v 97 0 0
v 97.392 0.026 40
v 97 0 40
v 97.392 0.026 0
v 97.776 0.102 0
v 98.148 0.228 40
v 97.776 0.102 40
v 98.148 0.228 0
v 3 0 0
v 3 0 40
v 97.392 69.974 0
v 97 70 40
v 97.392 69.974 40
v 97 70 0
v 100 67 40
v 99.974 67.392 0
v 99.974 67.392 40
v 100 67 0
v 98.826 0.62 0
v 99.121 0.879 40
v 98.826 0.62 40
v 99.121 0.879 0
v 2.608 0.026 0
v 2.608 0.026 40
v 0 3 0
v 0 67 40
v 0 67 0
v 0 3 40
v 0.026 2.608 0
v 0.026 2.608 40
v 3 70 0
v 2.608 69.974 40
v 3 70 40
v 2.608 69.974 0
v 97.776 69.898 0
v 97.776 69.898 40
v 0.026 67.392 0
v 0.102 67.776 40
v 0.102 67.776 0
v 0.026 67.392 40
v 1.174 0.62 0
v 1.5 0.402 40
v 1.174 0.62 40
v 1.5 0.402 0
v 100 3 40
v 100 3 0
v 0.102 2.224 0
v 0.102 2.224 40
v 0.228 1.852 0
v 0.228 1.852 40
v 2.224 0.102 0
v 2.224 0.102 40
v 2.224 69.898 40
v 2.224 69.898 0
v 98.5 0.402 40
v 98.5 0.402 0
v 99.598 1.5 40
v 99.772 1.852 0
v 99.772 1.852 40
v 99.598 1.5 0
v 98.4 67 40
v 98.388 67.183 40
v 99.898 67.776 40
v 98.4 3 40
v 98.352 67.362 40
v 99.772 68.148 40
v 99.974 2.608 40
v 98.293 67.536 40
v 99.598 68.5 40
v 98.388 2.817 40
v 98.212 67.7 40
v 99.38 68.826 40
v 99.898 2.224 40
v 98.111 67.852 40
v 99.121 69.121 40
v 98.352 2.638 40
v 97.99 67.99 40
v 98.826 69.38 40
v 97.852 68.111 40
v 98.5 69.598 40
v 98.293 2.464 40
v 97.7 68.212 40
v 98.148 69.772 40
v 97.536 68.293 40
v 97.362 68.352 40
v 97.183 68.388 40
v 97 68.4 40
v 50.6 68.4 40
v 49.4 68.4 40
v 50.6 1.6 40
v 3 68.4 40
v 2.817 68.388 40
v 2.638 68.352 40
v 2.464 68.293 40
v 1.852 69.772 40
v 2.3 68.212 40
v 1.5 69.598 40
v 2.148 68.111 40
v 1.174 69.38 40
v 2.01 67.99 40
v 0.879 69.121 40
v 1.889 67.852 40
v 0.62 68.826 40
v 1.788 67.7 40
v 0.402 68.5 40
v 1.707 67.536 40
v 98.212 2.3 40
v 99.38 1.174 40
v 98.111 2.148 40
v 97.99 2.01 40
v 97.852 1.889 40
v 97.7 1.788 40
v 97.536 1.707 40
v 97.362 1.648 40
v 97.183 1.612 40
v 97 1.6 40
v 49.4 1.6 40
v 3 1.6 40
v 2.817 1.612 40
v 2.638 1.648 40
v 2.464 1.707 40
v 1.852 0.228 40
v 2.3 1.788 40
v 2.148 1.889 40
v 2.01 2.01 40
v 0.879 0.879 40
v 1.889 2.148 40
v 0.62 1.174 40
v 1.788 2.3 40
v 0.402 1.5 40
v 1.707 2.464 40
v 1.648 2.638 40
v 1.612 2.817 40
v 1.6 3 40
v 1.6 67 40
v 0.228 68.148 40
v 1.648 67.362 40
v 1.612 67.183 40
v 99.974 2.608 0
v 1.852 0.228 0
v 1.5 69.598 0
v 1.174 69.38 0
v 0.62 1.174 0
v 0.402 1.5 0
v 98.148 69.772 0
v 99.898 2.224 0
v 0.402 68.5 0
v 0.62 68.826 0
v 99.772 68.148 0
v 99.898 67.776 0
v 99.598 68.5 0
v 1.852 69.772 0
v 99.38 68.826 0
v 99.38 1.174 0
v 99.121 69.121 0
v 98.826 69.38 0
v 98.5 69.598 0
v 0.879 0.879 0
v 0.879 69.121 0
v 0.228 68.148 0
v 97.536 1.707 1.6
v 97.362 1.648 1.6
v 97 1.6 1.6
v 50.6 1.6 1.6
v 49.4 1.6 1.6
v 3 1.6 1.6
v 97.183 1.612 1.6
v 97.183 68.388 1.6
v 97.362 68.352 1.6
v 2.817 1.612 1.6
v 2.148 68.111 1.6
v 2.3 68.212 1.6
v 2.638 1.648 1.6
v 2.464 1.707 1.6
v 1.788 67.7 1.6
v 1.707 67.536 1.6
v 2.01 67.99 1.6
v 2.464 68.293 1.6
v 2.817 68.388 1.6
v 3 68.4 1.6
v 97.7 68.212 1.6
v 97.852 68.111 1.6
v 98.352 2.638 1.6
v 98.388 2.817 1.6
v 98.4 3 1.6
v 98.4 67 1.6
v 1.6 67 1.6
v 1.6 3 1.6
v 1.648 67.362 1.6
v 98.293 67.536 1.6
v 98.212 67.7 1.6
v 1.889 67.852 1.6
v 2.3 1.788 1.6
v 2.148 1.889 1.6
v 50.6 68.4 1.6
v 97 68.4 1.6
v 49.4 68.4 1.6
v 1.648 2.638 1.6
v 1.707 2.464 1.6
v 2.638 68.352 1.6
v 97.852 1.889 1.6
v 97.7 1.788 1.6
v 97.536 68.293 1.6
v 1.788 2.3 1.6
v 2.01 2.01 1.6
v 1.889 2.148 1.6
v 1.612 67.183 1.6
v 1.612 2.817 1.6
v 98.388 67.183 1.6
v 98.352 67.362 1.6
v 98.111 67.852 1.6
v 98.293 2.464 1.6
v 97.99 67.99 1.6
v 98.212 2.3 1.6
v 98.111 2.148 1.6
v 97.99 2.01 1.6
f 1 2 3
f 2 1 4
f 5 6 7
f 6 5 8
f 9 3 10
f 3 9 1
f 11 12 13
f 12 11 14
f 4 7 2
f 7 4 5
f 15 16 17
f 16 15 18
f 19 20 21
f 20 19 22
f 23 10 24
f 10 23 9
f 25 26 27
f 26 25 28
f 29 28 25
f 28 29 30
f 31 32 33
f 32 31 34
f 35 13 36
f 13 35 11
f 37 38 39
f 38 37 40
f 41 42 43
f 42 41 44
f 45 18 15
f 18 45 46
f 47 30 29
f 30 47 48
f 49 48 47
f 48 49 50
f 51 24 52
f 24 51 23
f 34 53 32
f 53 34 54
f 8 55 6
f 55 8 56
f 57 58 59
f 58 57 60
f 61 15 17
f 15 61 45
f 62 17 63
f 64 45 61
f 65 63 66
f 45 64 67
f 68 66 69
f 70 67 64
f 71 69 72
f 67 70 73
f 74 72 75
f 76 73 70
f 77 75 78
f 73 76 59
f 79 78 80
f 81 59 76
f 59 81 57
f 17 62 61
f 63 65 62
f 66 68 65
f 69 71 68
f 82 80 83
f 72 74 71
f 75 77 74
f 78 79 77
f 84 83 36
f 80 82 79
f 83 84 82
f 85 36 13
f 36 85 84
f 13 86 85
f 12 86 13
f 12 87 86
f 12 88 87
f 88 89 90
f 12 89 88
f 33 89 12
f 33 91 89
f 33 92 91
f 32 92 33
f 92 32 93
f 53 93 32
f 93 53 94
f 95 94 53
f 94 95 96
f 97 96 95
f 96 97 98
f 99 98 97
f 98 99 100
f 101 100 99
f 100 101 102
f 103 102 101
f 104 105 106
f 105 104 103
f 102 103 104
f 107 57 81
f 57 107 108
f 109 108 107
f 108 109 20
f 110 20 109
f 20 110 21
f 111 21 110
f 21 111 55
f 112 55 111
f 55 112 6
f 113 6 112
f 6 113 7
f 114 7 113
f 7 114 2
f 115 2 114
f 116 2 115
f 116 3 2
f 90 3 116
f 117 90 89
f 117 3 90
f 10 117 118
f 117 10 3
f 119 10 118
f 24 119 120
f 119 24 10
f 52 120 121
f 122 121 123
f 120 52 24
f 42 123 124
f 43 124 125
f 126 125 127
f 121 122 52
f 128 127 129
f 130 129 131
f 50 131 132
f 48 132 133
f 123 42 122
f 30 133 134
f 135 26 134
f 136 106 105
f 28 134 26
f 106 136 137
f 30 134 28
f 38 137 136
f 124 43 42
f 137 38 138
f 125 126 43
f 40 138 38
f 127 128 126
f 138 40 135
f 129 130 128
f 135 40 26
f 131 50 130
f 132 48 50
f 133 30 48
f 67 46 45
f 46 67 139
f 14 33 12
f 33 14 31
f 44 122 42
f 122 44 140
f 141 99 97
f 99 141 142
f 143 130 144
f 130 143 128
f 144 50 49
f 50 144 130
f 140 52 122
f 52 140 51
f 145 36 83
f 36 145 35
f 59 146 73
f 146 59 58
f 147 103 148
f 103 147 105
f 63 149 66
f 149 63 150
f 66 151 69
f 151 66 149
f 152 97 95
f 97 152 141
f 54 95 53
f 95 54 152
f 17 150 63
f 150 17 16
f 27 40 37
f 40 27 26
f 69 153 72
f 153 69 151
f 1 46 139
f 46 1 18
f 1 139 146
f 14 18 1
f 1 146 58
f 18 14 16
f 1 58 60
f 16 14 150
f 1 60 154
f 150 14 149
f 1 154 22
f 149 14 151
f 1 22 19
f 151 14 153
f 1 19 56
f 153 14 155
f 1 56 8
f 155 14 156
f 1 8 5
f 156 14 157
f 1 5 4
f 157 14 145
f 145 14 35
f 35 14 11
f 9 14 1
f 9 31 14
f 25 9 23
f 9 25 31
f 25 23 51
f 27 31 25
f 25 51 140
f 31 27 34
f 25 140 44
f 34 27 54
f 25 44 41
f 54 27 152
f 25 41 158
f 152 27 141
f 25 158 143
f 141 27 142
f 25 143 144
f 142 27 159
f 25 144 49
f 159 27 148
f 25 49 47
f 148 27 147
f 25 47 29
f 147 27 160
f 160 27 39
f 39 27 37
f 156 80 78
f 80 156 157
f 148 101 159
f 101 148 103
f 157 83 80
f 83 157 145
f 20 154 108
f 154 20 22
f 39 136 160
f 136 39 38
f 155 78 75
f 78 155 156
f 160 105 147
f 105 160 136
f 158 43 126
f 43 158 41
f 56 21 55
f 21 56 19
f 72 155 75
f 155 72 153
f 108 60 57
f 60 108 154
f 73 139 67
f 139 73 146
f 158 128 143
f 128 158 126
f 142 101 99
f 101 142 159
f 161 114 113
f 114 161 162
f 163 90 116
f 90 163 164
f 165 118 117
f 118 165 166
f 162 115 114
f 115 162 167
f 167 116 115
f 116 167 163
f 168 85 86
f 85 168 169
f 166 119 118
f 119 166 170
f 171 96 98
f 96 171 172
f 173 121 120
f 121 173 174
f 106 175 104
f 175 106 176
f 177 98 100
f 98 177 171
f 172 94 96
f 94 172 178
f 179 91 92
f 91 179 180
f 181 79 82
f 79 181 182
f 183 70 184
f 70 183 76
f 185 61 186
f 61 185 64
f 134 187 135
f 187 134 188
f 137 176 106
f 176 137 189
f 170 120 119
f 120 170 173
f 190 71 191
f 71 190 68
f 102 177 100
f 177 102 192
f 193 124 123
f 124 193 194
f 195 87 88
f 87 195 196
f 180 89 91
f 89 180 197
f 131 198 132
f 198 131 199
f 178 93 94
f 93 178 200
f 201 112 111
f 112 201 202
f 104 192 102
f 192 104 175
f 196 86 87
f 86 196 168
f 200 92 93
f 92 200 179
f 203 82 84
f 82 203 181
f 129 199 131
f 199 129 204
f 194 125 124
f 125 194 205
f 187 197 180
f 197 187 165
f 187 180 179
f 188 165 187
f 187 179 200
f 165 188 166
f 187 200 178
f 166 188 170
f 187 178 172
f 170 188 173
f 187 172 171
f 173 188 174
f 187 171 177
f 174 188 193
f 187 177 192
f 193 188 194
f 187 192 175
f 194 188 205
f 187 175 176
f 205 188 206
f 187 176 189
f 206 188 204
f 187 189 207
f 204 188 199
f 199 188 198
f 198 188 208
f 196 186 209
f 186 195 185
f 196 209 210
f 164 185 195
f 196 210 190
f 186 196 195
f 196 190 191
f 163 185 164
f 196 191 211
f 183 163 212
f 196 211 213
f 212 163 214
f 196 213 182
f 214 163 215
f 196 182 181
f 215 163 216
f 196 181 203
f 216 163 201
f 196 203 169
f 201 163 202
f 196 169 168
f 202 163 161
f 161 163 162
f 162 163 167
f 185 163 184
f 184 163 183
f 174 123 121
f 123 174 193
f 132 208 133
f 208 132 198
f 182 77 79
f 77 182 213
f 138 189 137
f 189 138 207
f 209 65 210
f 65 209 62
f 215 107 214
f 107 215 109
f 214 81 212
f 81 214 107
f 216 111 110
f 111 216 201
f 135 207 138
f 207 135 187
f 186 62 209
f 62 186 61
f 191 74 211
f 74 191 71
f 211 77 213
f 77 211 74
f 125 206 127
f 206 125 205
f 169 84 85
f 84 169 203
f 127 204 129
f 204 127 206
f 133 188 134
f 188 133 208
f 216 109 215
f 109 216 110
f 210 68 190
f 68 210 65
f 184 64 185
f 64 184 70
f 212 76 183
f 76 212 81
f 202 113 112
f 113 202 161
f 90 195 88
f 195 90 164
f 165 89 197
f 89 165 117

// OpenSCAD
// Коробка / органайзер (B23). Параметры ниже переопределяет сервер: openscad -D length=100 ...
// Все размеры в мм, внешние. Коробка стоит на столе: длина по X, ширина по Y, высота по Z,
// угол коробки — в начале координат. Крышка (если выбрана) лежит рядом, дном вниз.

length = 100;        // длина снаружи
width = 70;          // ширина снаружи
height = 40;         // высота снаружи (без крышки)
wall = 1.6;          // толщина стенок
floor_t = 1.6;       // толщина дна
corner_r = 3;        // скругление вертикальных углов
cells_x = 2;         // ячеек по длине (1 — без перегородок)
cells_y = 1;         // ячеек по ширине
divider = 1.2;       // толщина перегородок
lid = "none";        // "none" | "inset" (бортик внутрь) | "cap" (колпачок снаружи)
lid_gap = 0.3;       // зазор между крышкой и коробкой, на сторону

$fn = 48;            // гладкость скруглений
eps = 0.01;          // небольшой запас, чтобы вырезы выходили за край детали
lip_h = 4;           // высота бортика крышки
min_cell = 5;        // уже этого ячейки не делаем — лишние перегородки пропускаем
lid_space = 10;      // расстояние между коробкой и крышкой на столе

// --- размеры -----------------------------------------------------------------------------
// Скругление не больше, чем позволяет короткая сторона; изнутри радиус меньше на стенку.
r_out = min(corner_r, (min(length, width) - 1) / 2);
r_in = max(r_out - wall, 0);
in_len = length - 2 * wall;      // внутренние размеры
in_wid = width - 2 * wall;

// Сколько ячеек поместится: каждая не уже min_cell.
function cells_fit(inner, n) =
    n <= 1 ? 1 : max(1, min(n, floor((inner + divider) / (divider + min_cell))));
// Координата i-й перегородки (i = 1..n-1) от внутреннего края: ячейки одинаковой ширины.
function div_pos(inner, n, i) = i * (inner - (n - 1) * divider) / n + (i - 1) * divider;

nx = cells_fit(in_len, cells_x);
ny = cells_fit(in_wid, cells_y);

// Под вкладную крышку перегородки ниже верха на бортик и зазор, иначе — вровень с краем.
div_top = height - (lid == "inset" ? lip_h + lid_gap : 0);

// --- заготовки ---------------------------------------------------------------------------
// Прямоугольник l × w со скруглёнными углами радиуса r, угол в начале координат (2D).
module rrect(l, w, r) {
    if (r > 0)
        translate([r, r]) offset(r = r) square([l - 2 * r, w - 2 * r]);
    else
        square([l, w]);
}

// Стакан: прямоугольная «ванна» l × w × h со стенкой t и дном b, угол в начале координат.
module tub(l, w, h, t, b, r) {
    difference() {
        linear_extrude(h) rrect(l, w, r);
        translate([t, t, b])
            linear_extrude(h - b + eps) rrect(l - 2 * t, w - 2 * t, max(r - t, 0));
    }
}

// --- коробка -----------------------------------------------------------------------------
module box() {
    tub(length, width, height, wall, floor_t, r_out);
    // Перегородки: от дна до div_top, слегка утоплены в стенки и дно, чтобы срослись без щелей.
    for (i = [1 : 1 : nx - 1])
        translate([wall + div_pos(in_len, nx, i), wall - eps, floor_t - eps])
            cube([divider, in_wid + 2 * eps, div_top - floor_t + eps]);
    for (j = [1 : 1 : ny - 1])
        translate([wall - eps, wall + div_pos(in_wid, ny, j), floor_t - eps])
            cube([in_len + 2 * eps, divider, div_top - floor_t + eps]);
}

// --- крышка ------------------------------------------------------------------------------
// Вкладная: пластина по размеру коробки и бортик-рамка, который входит внутрь коробки
// с зазором. Печатается пластиной вниз, бортиком вверх; на коробку ставится бортиком вниз.
module lid_inset() {
    lip_l = in_len - 2 * lid_gap;
    lip_w = in_wid - 2 * lid_gap;
    linear_extrude(floor_t) rrect(length, width, r_out);
    translate([wall + lid_gap, wall + lid_gap, floor_t - eps])
        linear_extrude(lip_h + eps) difference() {
            rrect(lip_l, lip_w, max(r_in - lid_gap, 0));
            // Рамка толщиной wall; если места на окно нет — бортик сплошной.
            if (lip_l > 2 * wall + 2 && lip_w > 2 * wall + 2)
                translate([wall, wall]) rrect(lip_l - 2 * wall, lip_w - 2 * wall, max(r_in - lid_gap - wall, 0));
        }
}

// Колпачок: стакан чуть больше коробки (на зазор и стенку), глубиной в бортик.
// Печатается дном вниз, открытой стороной вверх.
cap_l = length + 2 * lid_gap + 2 * wall;
cap_w = width + 2 * lid_gap + 2 * wall;
module lid_cap() {
    tub(cap_l, cap_w, floor_t + lip_h, wall, floor_t, r_out + lid_gap + wall);
}

// Крышка ложится рядом с коробкой: по Y, если коробка не шире, чем длиннее, иначе по X —
// так две детали занимают на столе меньше места.
module lid_part() {
    shift = width <= length ? [0, width + lid_space, 0] : [length + lid_space, 0, 0];
    translate(shift) {
        if (lid == "inset") lid_inset();
        if (lid == "cap") lid_cap();
    }
}

// --- сборка ------------------------------------------------------------------------------
union() {
    box();
    lid_part();
}
